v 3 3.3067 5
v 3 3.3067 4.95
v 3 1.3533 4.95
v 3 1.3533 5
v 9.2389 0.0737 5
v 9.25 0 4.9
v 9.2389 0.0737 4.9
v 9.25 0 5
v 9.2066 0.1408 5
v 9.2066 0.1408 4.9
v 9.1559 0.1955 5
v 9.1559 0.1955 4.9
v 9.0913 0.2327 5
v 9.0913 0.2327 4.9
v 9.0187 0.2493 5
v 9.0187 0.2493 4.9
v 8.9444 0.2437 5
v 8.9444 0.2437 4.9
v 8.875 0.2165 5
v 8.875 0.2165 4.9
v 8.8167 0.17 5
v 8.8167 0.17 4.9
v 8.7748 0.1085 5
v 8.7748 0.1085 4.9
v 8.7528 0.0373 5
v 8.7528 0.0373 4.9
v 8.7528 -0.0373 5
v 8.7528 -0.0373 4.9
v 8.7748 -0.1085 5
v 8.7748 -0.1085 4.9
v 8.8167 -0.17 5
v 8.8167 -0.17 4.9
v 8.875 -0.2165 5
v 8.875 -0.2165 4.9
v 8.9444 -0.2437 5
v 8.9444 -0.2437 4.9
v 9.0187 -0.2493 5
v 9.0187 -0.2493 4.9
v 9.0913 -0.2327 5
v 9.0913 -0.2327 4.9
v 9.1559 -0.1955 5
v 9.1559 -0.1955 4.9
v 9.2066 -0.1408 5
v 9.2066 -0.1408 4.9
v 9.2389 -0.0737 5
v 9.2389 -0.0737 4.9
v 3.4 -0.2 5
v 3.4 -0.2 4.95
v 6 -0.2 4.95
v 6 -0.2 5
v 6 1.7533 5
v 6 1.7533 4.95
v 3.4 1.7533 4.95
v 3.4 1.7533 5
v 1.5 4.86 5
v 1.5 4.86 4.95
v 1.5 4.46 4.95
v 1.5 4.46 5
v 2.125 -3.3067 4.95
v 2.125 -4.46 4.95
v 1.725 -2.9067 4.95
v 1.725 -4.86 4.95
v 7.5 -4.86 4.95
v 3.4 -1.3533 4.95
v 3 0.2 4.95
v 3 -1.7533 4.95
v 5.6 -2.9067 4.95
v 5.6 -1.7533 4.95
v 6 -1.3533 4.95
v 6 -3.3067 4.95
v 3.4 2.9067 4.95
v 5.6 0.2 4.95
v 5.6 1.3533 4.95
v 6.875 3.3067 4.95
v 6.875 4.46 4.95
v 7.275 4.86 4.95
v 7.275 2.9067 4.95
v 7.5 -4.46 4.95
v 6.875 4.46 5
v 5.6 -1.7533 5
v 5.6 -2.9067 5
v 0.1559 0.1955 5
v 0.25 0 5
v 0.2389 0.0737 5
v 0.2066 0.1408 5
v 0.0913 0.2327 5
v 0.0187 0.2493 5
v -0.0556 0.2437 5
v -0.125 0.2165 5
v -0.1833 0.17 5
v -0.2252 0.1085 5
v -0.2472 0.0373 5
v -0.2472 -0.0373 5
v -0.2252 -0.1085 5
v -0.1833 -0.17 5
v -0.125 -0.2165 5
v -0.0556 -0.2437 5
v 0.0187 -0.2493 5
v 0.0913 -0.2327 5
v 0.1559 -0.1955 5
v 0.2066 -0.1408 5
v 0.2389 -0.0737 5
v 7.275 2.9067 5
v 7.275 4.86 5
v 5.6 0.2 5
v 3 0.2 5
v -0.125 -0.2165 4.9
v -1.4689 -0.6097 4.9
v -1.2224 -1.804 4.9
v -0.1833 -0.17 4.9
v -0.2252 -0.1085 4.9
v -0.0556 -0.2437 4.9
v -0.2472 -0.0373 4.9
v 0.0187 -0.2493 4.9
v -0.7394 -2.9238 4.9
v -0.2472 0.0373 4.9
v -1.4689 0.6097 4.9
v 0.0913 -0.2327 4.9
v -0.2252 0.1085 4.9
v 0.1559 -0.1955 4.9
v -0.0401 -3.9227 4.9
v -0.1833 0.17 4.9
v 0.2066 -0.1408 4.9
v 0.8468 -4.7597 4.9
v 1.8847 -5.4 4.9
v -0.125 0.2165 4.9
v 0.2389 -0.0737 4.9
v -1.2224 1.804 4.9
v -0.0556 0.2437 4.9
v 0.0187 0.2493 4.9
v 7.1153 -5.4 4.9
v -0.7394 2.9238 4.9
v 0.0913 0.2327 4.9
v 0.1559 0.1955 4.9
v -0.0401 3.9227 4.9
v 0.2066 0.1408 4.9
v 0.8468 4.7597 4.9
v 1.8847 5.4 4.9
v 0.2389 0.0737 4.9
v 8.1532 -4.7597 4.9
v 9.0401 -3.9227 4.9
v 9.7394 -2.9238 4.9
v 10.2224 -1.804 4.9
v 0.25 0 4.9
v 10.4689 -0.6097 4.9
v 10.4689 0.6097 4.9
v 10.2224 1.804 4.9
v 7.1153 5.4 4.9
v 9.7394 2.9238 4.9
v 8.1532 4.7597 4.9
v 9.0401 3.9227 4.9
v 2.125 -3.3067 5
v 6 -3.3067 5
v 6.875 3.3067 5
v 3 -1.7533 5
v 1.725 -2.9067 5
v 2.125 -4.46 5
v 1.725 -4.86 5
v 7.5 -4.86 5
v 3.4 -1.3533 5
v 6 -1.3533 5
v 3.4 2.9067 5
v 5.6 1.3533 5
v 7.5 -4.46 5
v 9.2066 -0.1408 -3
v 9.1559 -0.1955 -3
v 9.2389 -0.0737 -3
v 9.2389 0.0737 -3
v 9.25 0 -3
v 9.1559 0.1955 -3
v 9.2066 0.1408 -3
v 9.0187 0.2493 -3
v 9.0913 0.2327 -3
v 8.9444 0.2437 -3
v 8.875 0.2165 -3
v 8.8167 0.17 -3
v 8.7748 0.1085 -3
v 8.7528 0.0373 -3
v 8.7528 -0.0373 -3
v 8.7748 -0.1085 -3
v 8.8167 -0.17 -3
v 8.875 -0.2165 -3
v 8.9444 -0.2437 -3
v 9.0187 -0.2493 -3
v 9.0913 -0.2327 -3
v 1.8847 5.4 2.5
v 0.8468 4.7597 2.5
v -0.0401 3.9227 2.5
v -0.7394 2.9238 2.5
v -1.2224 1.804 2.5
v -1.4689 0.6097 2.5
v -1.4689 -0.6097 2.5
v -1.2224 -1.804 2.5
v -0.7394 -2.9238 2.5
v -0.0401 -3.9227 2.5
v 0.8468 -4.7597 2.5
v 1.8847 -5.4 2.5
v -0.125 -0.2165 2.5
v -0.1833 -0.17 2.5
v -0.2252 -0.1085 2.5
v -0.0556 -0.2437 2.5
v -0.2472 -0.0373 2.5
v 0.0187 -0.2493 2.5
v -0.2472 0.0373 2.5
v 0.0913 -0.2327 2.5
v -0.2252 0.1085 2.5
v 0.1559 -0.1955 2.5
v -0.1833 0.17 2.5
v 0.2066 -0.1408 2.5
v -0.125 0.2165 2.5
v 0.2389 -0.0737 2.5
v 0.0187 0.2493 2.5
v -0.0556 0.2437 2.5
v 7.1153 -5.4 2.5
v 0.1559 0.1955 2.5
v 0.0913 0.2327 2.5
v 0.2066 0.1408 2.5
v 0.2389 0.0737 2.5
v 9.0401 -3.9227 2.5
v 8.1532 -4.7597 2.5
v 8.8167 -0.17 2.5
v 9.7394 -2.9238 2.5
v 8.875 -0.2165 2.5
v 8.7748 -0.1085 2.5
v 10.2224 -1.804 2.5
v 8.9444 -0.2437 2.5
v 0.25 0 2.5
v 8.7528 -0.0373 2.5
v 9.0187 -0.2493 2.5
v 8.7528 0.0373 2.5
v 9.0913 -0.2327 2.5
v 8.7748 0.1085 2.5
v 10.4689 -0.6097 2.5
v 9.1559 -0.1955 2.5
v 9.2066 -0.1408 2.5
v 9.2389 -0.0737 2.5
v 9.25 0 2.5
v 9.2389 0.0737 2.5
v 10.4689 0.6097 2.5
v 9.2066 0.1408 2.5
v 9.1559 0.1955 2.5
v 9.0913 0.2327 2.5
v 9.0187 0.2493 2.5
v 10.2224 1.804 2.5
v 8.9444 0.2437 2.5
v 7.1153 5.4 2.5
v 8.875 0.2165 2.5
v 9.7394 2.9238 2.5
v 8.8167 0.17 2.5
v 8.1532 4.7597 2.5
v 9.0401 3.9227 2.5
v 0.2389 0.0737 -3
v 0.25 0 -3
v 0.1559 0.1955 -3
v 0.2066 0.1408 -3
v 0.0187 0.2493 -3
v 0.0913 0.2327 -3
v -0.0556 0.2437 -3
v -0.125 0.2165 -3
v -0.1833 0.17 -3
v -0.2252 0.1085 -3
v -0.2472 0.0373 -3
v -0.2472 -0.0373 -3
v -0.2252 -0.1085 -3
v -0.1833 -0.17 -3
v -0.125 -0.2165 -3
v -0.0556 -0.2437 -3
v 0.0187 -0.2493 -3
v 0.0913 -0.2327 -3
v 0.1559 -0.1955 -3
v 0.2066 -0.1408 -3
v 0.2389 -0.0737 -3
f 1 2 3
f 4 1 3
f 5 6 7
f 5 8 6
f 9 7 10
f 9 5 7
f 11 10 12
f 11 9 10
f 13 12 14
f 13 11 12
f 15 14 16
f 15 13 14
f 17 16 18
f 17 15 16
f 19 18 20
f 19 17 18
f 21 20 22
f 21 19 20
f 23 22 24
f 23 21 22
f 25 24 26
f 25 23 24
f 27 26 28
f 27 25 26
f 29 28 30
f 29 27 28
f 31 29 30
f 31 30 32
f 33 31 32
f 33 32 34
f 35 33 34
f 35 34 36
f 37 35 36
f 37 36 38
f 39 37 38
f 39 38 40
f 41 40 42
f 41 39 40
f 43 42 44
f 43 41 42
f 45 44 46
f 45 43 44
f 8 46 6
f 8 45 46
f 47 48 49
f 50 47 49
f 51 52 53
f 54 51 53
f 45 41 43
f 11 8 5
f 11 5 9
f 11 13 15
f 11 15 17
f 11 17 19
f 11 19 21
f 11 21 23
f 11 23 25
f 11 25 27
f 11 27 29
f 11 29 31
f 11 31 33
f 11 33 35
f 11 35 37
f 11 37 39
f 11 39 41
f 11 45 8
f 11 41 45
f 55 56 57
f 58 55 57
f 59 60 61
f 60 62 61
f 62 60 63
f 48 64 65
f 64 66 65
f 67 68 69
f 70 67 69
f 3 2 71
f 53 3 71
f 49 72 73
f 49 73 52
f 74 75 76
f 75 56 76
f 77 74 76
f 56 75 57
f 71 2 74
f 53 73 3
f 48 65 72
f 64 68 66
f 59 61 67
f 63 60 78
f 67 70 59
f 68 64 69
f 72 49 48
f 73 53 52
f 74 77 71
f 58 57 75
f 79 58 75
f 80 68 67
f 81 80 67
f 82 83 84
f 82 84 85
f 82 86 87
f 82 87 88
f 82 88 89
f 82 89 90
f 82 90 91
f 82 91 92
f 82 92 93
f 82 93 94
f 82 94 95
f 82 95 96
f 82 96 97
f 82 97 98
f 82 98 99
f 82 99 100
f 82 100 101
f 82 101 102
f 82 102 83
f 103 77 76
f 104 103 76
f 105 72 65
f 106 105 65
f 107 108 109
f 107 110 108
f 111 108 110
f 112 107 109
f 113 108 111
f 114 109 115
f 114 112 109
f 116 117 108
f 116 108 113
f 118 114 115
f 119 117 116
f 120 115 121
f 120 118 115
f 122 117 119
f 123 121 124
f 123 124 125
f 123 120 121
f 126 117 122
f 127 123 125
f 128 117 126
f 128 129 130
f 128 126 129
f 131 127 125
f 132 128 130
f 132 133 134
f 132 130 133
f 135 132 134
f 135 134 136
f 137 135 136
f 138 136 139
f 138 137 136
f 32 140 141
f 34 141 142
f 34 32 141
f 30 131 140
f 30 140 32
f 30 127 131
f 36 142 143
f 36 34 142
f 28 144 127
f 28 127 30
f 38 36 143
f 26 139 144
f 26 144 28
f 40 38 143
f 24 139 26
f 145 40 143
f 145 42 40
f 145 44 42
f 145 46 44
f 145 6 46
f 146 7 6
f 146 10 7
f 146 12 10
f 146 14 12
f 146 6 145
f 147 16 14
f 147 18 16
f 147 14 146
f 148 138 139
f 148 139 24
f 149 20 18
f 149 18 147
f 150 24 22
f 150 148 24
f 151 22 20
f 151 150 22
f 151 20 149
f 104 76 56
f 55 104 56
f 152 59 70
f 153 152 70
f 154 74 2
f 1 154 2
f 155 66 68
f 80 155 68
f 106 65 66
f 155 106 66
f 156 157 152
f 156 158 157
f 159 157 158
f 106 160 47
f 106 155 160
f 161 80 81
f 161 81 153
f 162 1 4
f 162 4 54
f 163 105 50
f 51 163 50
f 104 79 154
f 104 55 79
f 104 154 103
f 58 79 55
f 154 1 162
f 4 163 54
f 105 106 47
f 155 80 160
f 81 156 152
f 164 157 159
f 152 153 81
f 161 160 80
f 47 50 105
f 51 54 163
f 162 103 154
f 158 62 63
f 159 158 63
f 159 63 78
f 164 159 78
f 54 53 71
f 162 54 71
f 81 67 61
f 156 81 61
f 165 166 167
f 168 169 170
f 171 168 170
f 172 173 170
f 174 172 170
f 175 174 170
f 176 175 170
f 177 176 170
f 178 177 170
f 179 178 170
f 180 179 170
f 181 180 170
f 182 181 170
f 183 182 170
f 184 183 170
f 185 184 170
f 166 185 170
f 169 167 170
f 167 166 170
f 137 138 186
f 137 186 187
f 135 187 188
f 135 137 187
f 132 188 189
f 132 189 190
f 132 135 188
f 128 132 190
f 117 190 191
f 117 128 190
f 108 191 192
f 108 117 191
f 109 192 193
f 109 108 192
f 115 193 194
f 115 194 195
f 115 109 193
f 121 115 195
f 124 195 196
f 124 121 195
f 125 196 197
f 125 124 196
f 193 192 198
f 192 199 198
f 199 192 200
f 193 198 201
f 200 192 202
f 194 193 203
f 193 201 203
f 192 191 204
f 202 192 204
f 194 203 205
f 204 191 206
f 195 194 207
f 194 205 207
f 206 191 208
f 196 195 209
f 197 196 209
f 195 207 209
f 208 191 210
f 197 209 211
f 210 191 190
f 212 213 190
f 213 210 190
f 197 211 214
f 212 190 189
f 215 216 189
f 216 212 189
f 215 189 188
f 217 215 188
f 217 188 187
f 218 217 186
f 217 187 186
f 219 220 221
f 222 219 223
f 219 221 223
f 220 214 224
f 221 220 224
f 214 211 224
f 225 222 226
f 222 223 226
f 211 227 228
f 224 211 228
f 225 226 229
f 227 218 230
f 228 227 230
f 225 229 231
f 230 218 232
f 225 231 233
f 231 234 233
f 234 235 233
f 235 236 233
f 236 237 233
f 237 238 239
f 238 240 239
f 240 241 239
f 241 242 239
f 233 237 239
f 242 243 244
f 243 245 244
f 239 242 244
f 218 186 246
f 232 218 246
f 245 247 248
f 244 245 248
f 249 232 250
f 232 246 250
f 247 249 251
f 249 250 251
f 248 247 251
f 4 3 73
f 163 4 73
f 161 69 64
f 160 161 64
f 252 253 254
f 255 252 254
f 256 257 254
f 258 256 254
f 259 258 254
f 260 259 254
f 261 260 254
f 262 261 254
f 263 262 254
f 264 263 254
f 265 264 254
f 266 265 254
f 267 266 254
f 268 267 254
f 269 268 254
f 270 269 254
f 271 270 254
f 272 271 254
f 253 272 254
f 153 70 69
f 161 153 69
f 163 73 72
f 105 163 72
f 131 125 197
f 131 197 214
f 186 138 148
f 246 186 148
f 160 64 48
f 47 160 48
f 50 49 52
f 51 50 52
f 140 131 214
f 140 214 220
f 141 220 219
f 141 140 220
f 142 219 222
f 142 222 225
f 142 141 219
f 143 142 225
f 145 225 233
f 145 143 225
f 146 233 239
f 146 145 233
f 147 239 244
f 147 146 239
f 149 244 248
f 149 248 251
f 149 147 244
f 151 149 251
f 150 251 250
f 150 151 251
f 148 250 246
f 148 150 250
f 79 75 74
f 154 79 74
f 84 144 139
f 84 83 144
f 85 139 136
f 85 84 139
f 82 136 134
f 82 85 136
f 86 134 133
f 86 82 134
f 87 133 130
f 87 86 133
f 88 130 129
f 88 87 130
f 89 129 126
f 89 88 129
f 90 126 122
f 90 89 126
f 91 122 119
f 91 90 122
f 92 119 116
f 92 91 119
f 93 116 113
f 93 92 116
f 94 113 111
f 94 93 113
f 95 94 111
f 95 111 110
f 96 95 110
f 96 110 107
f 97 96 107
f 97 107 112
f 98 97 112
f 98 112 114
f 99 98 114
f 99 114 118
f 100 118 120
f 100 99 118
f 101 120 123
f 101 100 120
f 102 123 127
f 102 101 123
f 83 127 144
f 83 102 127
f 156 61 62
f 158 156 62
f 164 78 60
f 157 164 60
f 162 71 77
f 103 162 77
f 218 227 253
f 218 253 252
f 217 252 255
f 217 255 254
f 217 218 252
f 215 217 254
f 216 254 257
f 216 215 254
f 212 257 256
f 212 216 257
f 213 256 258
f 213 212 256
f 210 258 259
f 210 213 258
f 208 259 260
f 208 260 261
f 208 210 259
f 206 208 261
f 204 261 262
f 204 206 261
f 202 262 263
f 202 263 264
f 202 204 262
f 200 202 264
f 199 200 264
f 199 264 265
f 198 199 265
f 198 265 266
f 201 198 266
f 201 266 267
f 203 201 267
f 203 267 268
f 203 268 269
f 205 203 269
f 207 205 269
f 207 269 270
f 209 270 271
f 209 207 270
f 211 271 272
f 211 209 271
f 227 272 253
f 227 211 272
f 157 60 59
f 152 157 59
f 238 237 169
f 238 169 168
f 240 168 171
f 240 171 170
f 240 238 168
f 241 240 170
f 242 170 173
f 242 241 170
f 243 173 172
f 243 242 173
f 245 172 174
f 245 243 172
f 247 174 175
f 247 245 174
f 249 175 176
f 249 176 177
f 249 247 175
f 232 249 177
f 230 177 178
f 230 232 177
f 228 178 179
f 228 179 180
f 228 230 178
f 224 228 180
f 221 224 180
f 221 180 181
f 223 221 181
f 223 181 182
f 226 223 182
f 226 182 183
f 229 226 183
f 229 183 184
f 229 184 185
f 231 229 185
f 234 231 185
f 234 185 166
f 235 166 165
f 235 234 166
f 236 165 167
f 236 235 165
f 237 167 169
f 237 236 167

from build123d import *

# Parameters (mm, degrees)
PAD001_DEPTH   = 2.4
SKETCH_R       = 0.25
PAD_DEPTH      = 5
PAD_DEPTH_BACK = 3
PAD002_DEPTH   = 0.05


with BuildPart() as pad001:
    # Sketch001 → Pad001 (new body)
    with BuildSketch(Plane.XY.offset(4.9)):
        with BuildLine():
            ThreePointArc((1.884661, 5.4), (-1.5, 0), (1.884661, -5.4))
            Line((1.884661, -5.4), (7.115339, -5.4))
            ThreePointArc((7.115339, -5.4), (10.5, 0), (7.115339, 5.4))
            Line((1.884661, 5.4), (7.115339, 5.4))
        make_face()
    extrude(amount=-PAD001_DEPTH)


with BuildPart() as pad:
    # Sketch → Pad (new body, two sides)
    with BuildSketch(Plane.XY) as pad_sk:
        Circle(SKETCH_R)
        with Locations((9, 0)):
            Circle(SKETCH_R)
    extrude(amount=PAD_DEPTH)
    extrude(pad_sk.sketch, amount=-PAD_DEPTH_BACK)


with BuildPart() as r_ldr_12x10_8mm_p9_0mm_vertical:
    # Sketch002 → Pad002 (new body)
    with BuildSketch(Plane.XY.offset(4.95)):
        Polygon((1.5, 4.46), (6.875, 4.46), (6.875, 3.306667), (3, 3.306667), (3, 2.906667), (3, 1.353333), (3.4, 1.353333), (5.6, 1.353333), (5.6, 0.2), (3, 0.2), (3, -0.2), (3, -1.753333), (3.4, -1.753333), (5.6, -1.753333), (5.6, -2.906667), (1.725, -2.906667), (1.725, -3.306667), (1.725, -4.86), (2.125, -4.86), (7.5, -4.86), (7.5, -4.46), (2.125, -4.46), (2.125, -3.306667), (5.6, -3.306667), (6, -3.306667), (6, -1.753333), (6, -1.353333), (3.4, -1.353333), (3.4, -0.2), (5.6, -0.2), (6, -0.2), (6, 1.353333), (6, 1.753333), (3.4, 1.753333), (3.4, 2.906667), (6.875, 2.906667), (7.275, 2.906667), (7.275, 4.46), (7.275, 4.86), (1.5, 4.86), align=None)
    extrude(amount=PAD002_DEPTH)

    # Pad002_mp_cp: union Pad001, Pad
    add(pad001.part)
    add(pad.part)


solid = r_ldr_12x10_8mm_p9_0mm_vertical.part
